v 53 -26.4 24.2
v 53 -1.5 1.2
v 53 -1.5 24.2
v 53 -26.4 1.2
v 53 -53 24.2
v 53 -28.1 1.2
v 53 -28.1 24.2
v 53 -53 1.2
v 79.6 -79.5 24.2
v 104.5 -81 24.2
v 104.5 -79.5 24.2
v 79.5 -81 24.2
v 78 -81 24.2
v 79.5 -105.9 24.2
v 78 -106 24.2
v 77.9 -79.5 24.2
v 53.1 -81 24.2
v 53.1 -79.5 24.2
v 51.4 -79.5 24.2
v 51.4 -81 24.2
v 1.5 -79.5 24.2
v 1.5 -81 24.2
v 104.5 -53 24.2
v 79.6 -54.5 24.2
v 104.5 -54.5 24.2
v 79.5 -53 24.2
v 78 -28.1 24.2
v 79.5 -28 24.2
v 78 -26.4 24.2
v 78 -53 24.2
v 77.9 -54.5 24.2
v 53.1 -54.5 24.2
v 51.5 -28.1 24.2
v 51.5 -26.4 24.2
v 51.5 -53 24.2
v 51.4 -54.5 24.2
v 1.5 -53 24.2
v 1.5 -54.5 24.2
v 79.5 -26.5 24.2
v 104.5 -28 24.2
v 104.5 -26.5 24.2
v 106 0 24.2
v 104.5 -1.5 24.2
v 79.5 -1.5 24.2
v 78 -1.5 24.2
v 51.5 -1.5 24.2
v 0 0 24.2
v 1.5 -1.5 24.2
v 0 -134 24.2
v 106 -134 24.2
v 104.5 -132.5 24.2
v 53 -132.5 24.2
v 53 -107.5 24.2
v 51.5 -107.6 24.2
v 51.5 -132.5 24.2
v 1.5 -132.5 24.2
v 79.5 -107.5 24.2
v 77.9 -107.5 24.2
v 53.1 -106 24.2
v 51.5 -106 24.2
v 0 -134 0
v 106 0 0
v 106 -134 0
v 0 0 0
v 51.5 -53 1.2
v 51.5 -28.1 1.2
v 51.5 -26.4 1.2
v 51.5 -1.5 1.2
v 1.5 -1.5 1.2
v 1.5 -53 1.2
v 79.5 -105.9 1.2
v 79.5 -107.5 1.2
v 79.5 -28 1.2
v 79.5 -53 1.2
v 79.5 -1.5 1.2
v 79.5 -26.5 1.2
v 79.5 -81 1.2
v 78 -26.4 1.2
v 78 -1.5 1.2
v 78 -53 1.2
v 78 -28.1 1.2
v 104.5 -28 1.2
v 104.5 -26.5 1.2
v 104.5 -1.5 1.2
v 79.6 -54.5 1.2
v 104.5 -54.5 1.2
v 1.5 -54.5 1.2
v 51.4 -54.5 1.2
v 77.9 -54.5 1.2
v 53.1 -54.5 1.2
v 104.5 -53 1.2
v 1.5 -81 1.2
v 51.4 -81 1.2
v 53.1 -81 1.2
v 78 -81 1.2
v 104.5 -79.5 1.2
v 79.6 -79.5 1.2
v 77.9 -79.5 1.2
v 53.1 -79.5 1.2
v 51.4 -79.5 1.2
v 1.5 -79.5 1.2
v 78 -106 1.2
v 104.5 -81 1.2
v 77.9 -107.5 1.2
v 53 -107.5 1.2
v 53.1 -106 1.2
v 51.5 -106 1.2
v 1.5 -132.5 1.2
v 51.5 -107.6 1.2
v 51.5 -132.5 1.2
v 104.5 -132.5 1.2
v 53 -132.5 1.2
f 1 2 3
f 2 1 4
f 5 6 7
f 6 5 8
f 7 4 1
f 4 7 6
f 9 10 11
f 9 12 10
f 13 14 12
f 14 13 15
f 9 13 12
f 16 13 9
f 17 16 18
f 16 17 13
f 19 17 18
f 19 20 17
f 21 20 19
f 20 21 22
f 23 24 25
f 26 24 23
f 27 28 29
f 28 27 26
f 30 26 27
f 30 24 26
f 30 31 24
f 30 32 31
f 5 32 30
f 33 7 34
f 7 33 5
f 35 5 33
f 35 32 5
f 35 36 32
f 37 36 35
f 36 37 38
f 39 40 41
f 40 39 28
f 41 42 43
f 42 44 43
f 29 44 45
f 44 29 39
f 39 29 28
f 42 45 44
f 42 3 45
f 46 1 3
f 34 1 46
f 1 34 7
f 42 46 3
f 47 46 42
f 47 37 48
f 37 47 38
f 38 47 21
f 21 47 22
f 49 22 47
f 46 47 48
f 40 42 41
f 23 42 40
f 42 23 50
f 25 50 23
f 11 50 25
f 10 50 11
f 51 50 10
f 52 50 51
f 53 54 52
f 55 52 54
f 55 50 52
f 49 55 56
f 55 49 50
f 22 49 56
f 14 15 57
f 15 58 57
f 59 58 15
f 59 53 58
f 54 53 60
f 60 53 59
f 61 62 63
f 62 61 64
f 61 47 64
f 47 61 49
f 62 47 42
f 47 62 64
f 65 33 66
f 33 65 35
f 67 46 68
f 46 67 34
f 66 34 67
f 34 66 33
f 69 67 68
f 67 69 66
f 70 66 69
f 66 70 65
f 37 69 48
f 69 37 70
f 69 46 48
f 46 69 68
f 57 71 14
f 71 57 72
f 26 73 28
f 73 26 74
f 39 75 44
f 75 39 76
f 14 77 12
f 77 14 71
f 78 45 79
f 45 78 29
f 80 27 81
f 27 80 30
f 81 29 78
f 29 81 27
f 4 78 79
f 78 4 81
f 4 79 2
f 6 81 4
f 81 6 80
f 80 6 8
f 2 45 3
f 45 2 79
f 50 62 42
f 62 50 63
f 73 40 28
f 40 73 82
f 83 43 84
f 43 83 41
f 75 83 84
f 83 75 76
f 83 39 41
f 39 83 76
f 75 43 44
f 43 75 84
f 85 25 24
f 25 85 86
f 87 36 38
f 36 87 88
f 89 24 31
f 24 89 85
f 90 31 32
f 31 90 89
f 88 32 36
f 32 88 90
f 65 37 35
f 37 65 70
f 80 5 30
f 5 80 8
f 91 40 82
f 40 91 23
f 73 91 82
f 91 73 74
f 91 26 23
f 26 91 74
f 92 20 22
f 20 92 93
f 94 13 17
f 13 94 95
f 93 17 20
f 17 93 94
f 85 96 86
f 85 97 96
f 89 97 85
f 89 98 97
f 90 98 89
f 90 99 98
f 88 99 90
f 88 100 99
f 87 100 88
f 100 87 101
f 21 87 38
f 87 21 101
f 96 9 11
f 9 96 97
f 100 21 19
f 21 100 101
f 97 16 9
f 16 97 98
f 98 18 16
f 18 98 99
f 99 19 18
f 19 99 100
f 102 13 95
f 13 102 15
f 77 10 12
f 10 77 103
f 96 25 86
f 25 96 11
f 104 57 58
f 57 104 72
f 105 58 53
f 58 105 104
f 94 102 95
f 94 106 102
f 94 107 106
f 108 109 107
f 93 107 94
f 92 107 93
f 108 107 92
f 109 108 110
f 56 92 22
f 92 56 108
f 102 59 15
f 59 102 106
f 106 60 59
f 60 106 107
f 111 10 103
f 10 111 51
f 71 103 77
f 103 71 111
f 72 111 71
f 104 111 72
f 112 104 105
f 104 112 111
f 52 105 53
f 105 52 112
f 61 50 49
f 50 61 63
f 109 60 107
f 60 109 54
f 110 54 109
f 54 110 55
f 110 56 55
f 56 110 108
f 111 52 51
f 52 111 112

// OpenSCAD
/* [Tray Parameters] */
// Tray Maker.  A text based way to create a custom tray/bin.
// an array of bin widths (ex: column widths).  This example will create first column 50mm wide, second 25mm, third 25mm.  If a 4th is desired enter [50,25,25,45].  Then 4th column will be 45mm wide.  Adding additional columns will require tray layout modifications to accommodate extra column.
_x_bin_widths = [50,25,25];  
// an integer for y bin length (ex: row height)
_y_bin_length = 25;  
// depth of each bin
_z_depth = 23;  
// thickness of walls separating bins.
_wall_width = 1.5;   
// thickness of bottom of tray
_bottom_thickness = 1.2;

/* [Tray Layout] */
// tray layout, array of strings defining layout. More info in thing description about this parameter 
// number of tray rows to use
_num_rows = 5;  
// tray layout for row 1
_tray_layout_1 = "| | |_|"; 
// tray layout for row 2
_tray_layout_2 = "|_|_|_|"; 
// row 3
_tray_layout_3 = "|_ _ _|";  
// etc.
_tray_layout_4 = "|  _| |";  
_tray_layout_5 = "|_|_ _|";
_tray_layout_6 = "|_|_|_|";
_tray_layout_7 = "|_|_|_|";
_tray_layout_8 = "|_|_|_|";
_tray_layout_9 = "|_|_|_|";
_tray_layout_10 = "|_|_|_|";
_tray_layout_11 = "|_|_|_|";
_tray_layout_12 = "|_|_|_|";
_tray_layout_13 = "|_|_|_|";
_tray_layout_14 = "|_|_|_|";
_tray_layout_15 = "|_|_|_|";
_tray_layout_16 = "|_|_|_|";
_tray_layout_17 = "|_|_|_|";
_tray_layout_18 = "|_|_|_|";
_tray_layout_19 = "|_|_|_|";
_tray_layout_20 = "|_|_|_|";
_tray_layout_21 = "|_|_|_|";
_tray_layout_22 = "|_|_|_|";


/* [Lid Parameters] */
// generate a lid (instead of the tray) that fits the defined tray
_generate_lid = "false"; //[true, false] 
// thickness of lid top
_lid_thickness = 0.9;  
// thickness of the lid's sides
_lid_wall_thickness = 1.5; 
// the depth of the lid.  
_lid_depth = 15; 
// with no fudge, the lid will be snug.  Depending on printer or preference provide negative to make tighter, positive to make looser. (ex: 0.2 will make a looser fitter lid)
_lid_fudge = 0;  

/* [Hidden] */
// for use if using as library and able to view console output.
_grid_x = 3;  // used to generate message for copy/paste.
_grid_y = 4;  // used to generate message for copy/paste.

// all this fun stuff is because thingiverse customizer cannot accept an array of string values as input.  

_tray_layout_array =
concat(
    _tray_layout_1,
    _tray_layout_2 ,
    _tray_layout_3 ,
    _tray_layout_4 ,
    _tray_layout_5 ,
    _tray_layout_6 ,
    _tray_layout_7 ,
    _tray_layout_8 ,
    _tray_layout_9 ,
    _tray_layout_10,
    _tray_layout_11 ,
    _tray_layout_12 ,
    _tray_layout_13 ,
    _tray_layout_14 ,
    _tray_layout_15 ,
    _tray_layout_16 ,
    _tray_layout_17 ,
    _tray_layout_18 ,
    _tray_layout_19 ,
    _tray_layout_20 ,
    _tray_layout_21 ,
    _tray_layout_22
);
_tray_layout = [for(i=[0:_num_rows-1]) _tray_layout_array[i]];
    echo(_tray_layout);
// end the special tray_layout handling for customizer.

// Tray layout explained: each row start with and end with | (a pipe)
// alternate placing | or _ or use space for none
// | represent separations on the row _ is the bottom edge of the cell.
// if grid is x cell = 3 and y cells = 2, and want each cell separate:
// [
//    "|_|_|_|",
//    "|_|_|_|"
// ]
// if instead, the last row should be "merged":
// [
//    "|_|_|_|",
//    "|_ _ _|"
// ]
//_tray_layout = 
//[
//    "| | |_|",
//    "|_|_|_|",
//    "|_| |_|",
//    "|_|_|_|"
//];



// sum vector values
function sumv(v,i,s=0) = (i==s ? v[i] : v[i] + sumv(v,i-1,s));
// output example line for tray layout.
function outv(i) = (i==0 ? "|" : str(outv(i-1) , "_|"));

// this module can be used as part of a library.
module tray(tray_layout = ["|_|","|_|"],
            x_bin_widths = [35],
            y_bin_length = 25,
            z_depth = 20,
            wall_width = 1.2,
            bottom_thickness = 1.2,
            grid_x = 4, // only used to generate example array
            grid_y = 3  // only used to generate example array
             )
{
    
    rows = len(tray_layout);
    cols = (len(tray_layout[0]) - 1 ) / 2;
    tray_string_len = len(tray_layout[0]);
    x_widths=concat([0],x_bin_widths);
    
    
    // generate and output example for tray_layout... copy paste for ease.
    
    for(r=[0:grid_y-1])
    {
        echo(outv(grid_x));
    }
    
    
    // layout initial box with compartments.
    mirror([0,1,0])  // do to application of logic, need to mirror through y axis.
    {
    difference()
    {
    union()
    {
        for(r=[0:rows-1], c=[1:cols ])
        {
            
            translate([sumv(x_widths,c-1,0) + ((c-1) * wall_width) ,
                           (y_bin_length * r) + (r * wall_width) ,
                           0 ])
            difference()
            {
                
                cube([x_widths[c] + (wall_width * 2),
                    y_bin_length + (wall_width * 2),
                    z_depth + bottom_thickness]);
                translate([wall_width,wall_width,bottom_thickness])
                cube([x_widths[c] ,
                    y_bin_length ,
                    z_depth + bottom_thickness]);
            }
        }
    }
   
    // remove appropriate walls.
        for(r=[0:rows-1], c=[1:tray_string_len - 2])  
                          // assume first and last postion are |
        {
            if(c % 2 == 1)
            {
                // bottom wall
               if(r - 1 != len(tray_layout)) 
               // assume bottom wall exists for final row.
               {
                   if(tray_layout[r][c] == " ")  
                   {  // remove this wall.
                       
               
                       x_width_ref = (c - 1) / 2;
                       translate([sumv(x_widths,x_width_ref,0) + 
                                        wall_width + 
                                        (x_width_ref * wall_width),
                                 ((r + 1) * y_bin_length ) + 
                                      (r * wall_width) +
                                      wall_width ,
                                  0]) 
                       // nudge to cover entire wall, and mov to correct z.
                       translate([0,-0.1, bottom_thickness]) 
                       cube([x_bin_widths[x_width_ref],
                             wall_width + .2,
                            z_depth + bottom_thickness]);
                   }
                }
            }
            else
            {
               // side wall
               if(tray_layout[r][c] == " ")  
               {  // remove this wall.
                  
                  x_width_ref = (c/2);
                  translate([sumv(x_widths,x_width_ref,0) + 
                                        (x_width_ref * wall_width) ,
                             ((r) * y_bin_length ) + 
                                      (r * wall_width) +
                                      wall_width ,
                            0]) 
                  // nudge to cover entire wall, and mov to correct z. 
                  translate([-0.1,0,bottom_thickness]) 
                  cube([wall_width + .2, 
                        y_bin_length,
                        z_depth + bottom_thickness]); 
                   
                  // remove remaining peg if entire intersection should be removed
                  
                   if(tray_layout[r-1][c] == " " &&
                      tray_layout[r-1][c - 1] == " " &&
                      tray_layout[r-1][c - 1] == " " )
                   {
                       
                       translate([sumv(x_widths,x_width_ref,0) + 
                                        (x_width_ref * wall_width) ,
                             ((r) * y_bin_length ) + 
                                      (r * wall_width),
                            0])
                       translate([-0.1,-.1,bottom_thickness]) 
                       cube([wall_width + .2, 
                             wall_width + .2, 
                             z_depth + bottom_thickness]);
                   }
                   
                   
               }

            }
  
        }
    }
    } // end mirror
}

module tray_lid(      // generate a lid for the defined tray.
            lid_thickness = 1.2,
            lid_wall_thickness = 1.5,
            lid_depth = 15,
            lid_fudge =0,
            // --- following defines the tray this lid will fit---
            tray_layout = ["|_|","|_|"],
            x_bin_widths = [35],
            y_bin_length = 25,
            z_depth = 20,
            wall_width = 1.2,
            bottom_thickness = 1.2)
{
    rows = len(tray_layout);  
    cols = (len(tray_layout[0]) - 1 ) / 2;
    tray_string_len = len(tray_layout[0]);
    
    x_size_tray = sumv(x_bin_widths,len(x_bin_widths) - 1,0) + 
                      ((len(x_bin_widths) + 1) * wall_width);
    y_size_tray = (rows * y_bin_length) + ((rows + 1) * wall_width);
    
    // 0.8 is a good looseness for a lid (at least for my printrbot), fudging this can make tighter or looser.
    x_inner_lid = x_size_tray + 1 + lid_fudge;  
    y_inner_lid = y_size_tray + 1 + lid_fudge;
    
    x_lid_outer = x_inner_lid + (lid_wall_thickness * 2);
    y_lid_outer = y_inner_lid + (lid_wall_thickness * 2);
    z_lid_total_h = lid_depth + lid_thickness;
    difference()
    {
       cube([x_lid_outer, y_lid_outer, z_lid_total_h]);
       translate([lid_wall_thickness,lid_wall_thickness,lid_thickness]) 
          cube([x_inner_lid, y_inner_lid, z_lid_total_h]); 
    }
}


// if this is used as a library the "tray_layout" should be like the following: 
//_tray_layout = 
//[
//    "| | |_|",
//    "|_|_|_|",
//    "|_| |_|",
//    "|_|_|_|"
//];

if(_generate_lid == "true")
{
    tray_lid(
        _lid_thickness,
        _lid_wall_thickness,
        _lid_depth,
        _lid_fudge,
        _tray_layout ,
        _x_bin_widths ,
        _y_bin_length ,
        _z_depth ,
        _wall_width ,
        _bottom_thickness
        );
}
else
{
    tray(
        _tray_layout ,
        _x_bin_widths ,
        _y_bin_length ,
        _z_depth ,
        _wall_width ,
        _bottom_thickness ,
        _grid_x,
        _grid_y
    );
}
